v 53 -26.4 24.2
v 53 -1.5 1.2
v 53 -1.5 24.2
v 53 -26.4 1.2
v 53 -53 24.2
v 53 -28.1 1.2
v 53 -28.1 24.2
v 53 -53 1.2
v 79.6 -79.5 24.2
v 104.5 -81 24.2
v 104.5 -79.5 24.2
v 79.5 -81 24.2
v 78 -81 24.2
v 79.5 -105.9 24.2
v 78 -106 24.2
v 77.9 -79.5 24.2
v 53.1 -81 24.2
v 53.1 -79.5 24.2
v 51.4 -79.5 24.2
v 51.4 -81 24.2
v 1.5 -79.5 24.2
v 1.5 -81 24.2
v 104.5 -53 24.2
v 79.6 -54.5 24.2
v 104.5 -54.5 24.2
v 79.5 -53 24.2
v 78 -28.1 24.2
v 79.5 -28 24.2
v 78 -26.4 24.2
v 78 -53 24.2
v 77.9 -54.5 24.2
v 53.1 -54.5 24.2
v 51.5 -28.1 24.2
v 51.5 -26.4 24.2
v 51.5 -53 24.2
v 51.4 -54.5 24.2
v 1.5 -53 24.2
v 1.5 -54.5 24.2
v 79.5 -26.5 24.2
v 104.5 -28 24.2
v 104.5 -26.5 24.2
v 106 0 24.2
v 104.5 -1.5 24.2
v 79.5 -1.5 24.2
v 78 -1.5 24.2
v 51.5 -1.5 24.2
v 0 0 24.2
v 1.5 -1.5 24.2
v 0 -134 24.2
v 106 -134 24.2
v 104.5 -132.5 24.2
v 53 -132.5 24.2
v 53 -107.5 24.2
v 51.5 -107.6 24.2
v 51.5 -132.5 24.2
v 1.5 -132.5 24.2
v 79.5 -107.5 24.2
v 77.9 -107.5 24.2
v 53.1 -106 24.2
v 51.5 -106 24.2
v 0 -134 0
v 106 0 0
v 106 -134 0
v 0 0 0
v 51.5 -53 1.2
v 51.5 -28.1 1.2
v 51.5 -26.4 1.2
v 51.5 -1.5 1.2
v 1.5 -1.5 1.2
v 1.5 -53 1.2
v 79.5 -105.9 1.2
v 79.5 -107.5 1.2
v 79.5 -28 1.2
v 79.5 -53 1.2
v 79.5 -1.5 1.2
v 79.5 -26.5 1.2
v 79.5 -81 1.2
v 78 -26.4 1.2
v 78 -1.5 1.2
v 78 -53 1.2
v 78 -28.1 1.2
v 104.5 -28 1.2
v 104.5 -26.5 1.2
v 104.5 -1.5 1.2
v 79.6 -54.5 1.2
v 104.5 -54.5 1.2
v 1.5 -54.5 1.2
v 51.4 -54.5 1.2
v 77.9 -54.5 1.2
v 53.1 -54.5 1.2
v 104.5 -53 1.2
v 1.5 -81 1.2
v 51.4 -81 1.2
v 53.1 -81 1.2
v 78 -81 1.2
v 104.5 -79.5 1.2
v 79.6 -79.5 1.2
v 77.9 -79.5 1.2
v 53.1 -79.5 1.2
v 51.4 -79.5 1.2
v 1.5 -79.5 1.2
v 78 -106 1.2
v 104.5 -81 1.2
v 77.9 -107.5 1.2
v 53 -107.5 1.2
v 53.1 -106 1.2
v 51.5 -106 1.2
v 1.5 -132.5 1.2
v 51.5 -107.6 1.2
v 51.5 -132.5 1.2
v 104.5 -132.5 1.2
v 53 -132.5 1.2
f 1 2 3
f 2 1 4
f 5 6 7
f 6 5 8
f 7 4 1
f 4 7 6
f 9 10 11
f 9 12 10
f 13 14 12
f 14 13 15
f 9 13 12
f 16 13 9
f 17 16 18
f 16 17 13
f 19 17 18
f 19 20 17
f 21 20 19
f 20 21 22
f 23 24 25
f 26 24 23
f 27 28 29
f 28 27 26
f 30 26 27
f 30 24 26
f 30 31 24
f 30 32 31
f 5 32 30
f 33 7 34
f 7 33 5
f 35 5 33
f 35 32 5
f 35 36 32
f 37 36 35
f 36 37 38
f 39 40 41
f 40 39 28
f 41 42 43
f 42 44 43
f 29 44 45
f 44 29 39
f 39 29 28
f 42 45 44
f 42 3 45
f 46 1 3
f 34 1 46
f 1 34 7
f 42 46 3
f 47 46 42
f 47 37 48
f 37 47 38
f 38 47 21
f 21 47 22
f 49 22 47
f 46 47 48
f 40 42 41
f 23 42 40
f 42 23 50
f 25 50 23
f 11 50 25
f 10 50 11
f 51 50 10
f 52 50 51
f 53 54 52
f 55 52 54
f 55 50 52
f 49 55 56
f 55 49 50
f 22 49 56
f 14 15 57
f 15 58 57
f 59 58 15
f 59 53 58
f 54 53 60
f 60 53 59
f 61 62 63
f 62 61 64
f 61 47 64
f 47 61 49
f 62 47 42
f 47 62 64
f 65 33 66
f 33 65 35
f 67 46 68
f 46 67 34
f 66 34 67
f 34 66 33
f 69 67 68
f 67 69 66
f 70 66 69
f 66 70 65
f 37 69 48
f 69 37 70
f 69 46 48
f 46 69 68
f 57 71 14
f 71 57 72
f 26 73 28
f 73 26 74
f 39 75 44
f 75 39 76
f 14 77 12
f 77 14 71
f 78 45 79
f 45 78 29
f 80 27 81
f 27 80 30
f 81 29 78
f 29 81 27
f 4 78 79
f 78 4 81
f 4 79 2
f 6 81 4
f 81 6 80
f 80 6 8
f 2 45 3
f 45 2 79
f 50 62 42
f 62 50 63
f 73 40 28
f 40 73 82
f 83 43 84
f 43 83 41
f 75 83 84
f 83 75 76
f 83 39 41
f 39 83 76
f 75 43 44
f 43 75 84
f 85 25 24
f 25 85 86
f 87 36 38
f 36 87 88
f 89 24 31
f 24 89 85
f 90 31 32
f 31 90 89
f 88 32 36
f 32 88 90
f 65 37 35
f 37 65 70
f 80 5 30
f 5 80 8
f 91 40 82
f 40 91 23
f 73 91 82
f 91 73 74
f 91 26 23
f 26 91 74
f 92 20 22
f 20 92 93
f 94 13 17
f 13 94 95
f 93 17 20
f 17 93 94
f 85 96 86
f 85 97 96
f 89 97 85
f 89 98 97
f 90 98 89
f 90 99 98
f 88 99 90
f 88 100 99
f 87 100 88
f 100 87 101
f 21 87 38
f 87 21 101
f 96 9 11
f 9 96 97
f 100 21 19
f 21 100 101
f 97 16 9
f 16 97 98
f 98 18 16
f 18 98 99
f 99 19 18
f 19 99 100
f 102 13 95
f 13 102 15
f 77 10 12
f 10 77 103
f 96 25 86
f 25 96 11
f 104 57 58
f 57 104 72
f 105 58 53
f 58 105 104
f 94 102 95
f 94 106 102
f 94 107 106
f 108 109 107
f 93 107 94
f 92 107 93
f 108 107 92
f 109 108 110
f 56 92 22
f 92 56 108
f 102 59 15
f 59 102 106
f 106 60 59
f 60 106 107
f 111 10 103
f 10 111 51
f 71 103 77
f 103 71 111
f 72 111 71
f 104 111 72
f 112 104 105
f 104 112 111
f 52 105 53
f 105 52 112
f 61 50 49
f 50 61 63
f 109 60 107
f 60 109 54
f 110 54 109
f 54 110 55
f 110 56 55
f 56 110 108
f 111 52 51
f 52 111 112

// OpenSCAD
/* [Tray Parameters] */
// Tray Maker.  A text based way to create a custom tray/bin.
// an array of bin widths (ex: column widths).  This example will create first column 50mm wide, second 25mm, third 25mm.  If a 4th is desired enter [50,25,25,45].  Then 4th column will be 45mm wide.  Adding additional columns will require tray layout modifications to accommodate extra column.
_x_bin_widths = [50,25,25];  
// an integer for y bin length (ex: row height)
_y_bin_length = 25;  
// depth of each bin
_z_depth = 23;  
// thickness of walls separating bins.
_wall_width = 1.5;   
// thickness of bottom of tray
_bottom_thickness = 1.2;

/* [Tray Layout] */
// tray layout, array of strings defining layout. More info in thing description about this parameter 
// number of tray rows to use
_num_rows = 5;  
// tray layout for row 1
_tray_layout_1 = "| | |_|"; 
// tray layout for row 2
_tray_layout_2 = "|_|_|_|"; 
// row 3
_tray_layout_3 = "|_ _ _|";  
// etc.
_tray_layout_4 = "|  _| |";  
_tray_layout_5 = "|_|_ _|";
_tray_layout_6 = "|_|_|_|";
_tray_layout_7 = "|_|_|_|";
_tray_layout_8 = "|_|_|_|";
_tray_layout_9 = "|_|_|_|";
_tray_layout_10 = "|_|_|_|";
_tray_layout_11 = "|_|_|_|";
_tray_layout_12 = "|_|_|_|";
_tray_layout_13 = "|_|_|_|";
_tray_layout_14 = "|_|_|_|";
_tray_layout_15 = "|_|_|_|";
_tray_layout_16 = "|_|_|_|";
_tray_layout_17 = "|_|_|_|";
_tray_layout_18 = "|_|_|_|";
_tray_layout_19 = "|_|_|_|";
_tray_layout_20 = "|_|_|_|";
_tray_layout_21 = "|_|_|_|";
_tray_layout_22 = "|_|_|_|";


/* [Lid Parameters] */
// generate a lid (instead of the tray) that fits the defined tray
_generate_lid = "false"; //[true, false] 
// thickness of lid top
_lid_thickness = 0.9;  
// thickness of the lid's sides
_lid_wall_thickness = 1.5; 
// the depth of the lid.  
_lid_depth = 15; 
// with no fudge, the lid will be snug.  Depending on printer or preference provide negative to make tighter, positive to make looser. (ex: 0.2 will make a looser fitter lid)
_lid_fudge = 0;  

/* [Hidden] */
// for use if using as library and able to view console output.
_grid_x = 3;  // used to generate message for copy/paste.
_grid_y = 4;  // used to generate message for copy/paste.

// all this fun stuff is because thingiverse customizer cannot accept an array of string values as input.  

_tray_layout_array =
concat(
    _tray_layout_1,
    _tray_layout_2 ,
    _tray_layout_3 ,
    _tray_layout_4 ,
    _tray_layout_5 ,
    _tray_layout_6 ,
    _tray_layout_7 ,
    _tray_layout_8 ,
    _tray_layout_9 ,
    _tray_layout_10,
    _tray_layout_11 ,
    _tray_layout_12 ,
    _tray_layout_13 ,
    _tray_layout_14 ,
    _tray_layout_15 ,
    _tray_layout_16 ,
    _tray_layout_17 ,
    _tray_layout_18 ,
    _tray_layout_19 ,
    _tray_layout_20 ,
    _tray_layout_21 ,
    _tray_layout_22
);
_tray_layout = [for(i=[0:_num_rows-1]) _tray_layout_array[i]];
    echo(_tray_layout);
// end the special tray_layout handling for customizer.

// Tray layout explained: each row start with and end with | (a pipe)
// alternate placing | or _ or use space for none
// | represent separations on the row _ is the bottom edge of the cell.
// if grid is x cell = 3 and y cells = 2, and want each cell separate:
// [
//    "|_|_|_|",
//    "|_|_|_|"
// ]
// if instead, the last row should be "merged":
// [
//    "|_|_|_|",
//    "|_ _ _|"
// ]
//_tray_layout = 
//[
//    "| | |_|",
//    "|_|_|_|",
//    "|_| |_|",
//    "|_|_|_|"
//];



// sum vector values
function sumv(v,i,s=0) = (i==s ? v[i] : v[i] + sumv(v,i-1,s));
// output example line for tray layout.
function outv(i) = (i==0 ? "|" : str(outv(i-1) , "_|"));

// this module can be used as part of a library.
module tray(tray_layout = ["|_|","|_|"],
            x_bin_widths = [35],
            y_bin_length = 25,
            z_depth = 20,
            wall_width = 1.2,
            bottom_thickness = 1.2,
            grid_x = 4, // only used to generate example array
            grid_y = 3  // only used to generate example array
             )
{
    
    rows = len(tray_layout);
    cols = (len(tray_layout[0]) - 1 ) / 2;
    tray_string_len = len(tray_layout[0]);
    x_widths=concat([0],x_bin_widths);
    
    
    // generate and output example for tray_layout... copy paste for ease.
    
    for(r=[0:grid_y-1])
    {
        echo(outv(grid_x));
    }
    
    
    // layout initial box with compartments.
    mirror([0,1,0])  // do to application of logic, need to mirror through y axis.
    {
    difference()
    {
    union()
    {
        for(r=[0:rows-1], c=[1:cols ])
        {
            
            translate([sumv(x_widths,c-1,0) + ((c-1) * wall_width) ,
                           (y_bin_length * r) + (r * wall_width) ,
                           0 ])
            difference()
            {
                
                cube([x_widths[c] + (wall_width * 2),
                    y_bin_length + (wall_width * 2),
                    z_depth + bottom_thickness]);
                translate([wall_width,wall_width,bottom_thickness])
                cube([x_widths[c] ,
                    y_bin_length ,
                    z_depth + bottom_thickness]);
            }
        }
    }
   
    // remove appropriate walls.
        for(r=[0:rows-1], c=[1:tray_string_len - 2])  
                          // assume first and last postion are |
        {
            if(c % 2 == 1)
            {
                // bottom wall
               if(r - 1 != len(tray_layout)) 
               // assume bottom wall exists for final row.
               {
                   if(tray_layout[r][c] == " ")  
                   {  // remove this wall.
                       
               
                       x_width_ref = (c - 1) / 2;
                       translate([sumv(x_widths,x_width_ref,0) + 
                                        wall_width + 
                                        (x_width_ref * wall_width),
                                 ((r + 1) * y_bin_length ) + 
                                      (r * wall_width) +
                                      wall_width ,
                                  0]) 
                       // nudge to cover entire wall, and mov to correct z.
                       translate([0,-0.1, bottom_thickness]) 
                       cube([x_bin_widths[x_width_ref],
                             wall_width + .2,
                            z_depth + bottom_thickness]);
                   }
                }
            }
            else
            {
               // side wall
               if(tray_layout[r][c] == " ")  
               {  // remove this wall.
                  
                  x_width_ref = (c/2);
                  translate([sumv(x_widths,x_width_ref,0) + 
                                        (x_width_ref * wall_width) ,
                             ((r) * y_bin_length ) + 
                                      (r * wall_width) +
                                      wall_width ,
                            0]) 
                  // nudge to cover entire wall, and mov to correct z. 
                  translate([-0.1,0,bottom_thickness]) 
                  cube([wall_width + .2, 
                        y_bin_length,
                        z_depth + bottom_thickness]); 
                   
                  // remove remaining peg if entire intersection should be removed
                  
                   if(tray_layout[r-1][c] == " " &&
                      tray_layout[r-1][c - 1] == " " &&
                      tray_layout[r-1][c - 1] == " " )
                   {
                       
                       translate([sumv(x_widths,x_width_ref,0) + 
                                        (x_width_ref * wall_width) ,
                             ((r) * y_bin_length ) + 
                                      (r * wall_width),
                            0])
                       translate([-0.1,-.1,bottom_thickness]) 
                       cube([wall_width + .2, 
                             wall_width + .2, 
                             z_depth + bottom_thickness]);
                   }
                   
                   
               }

            }
  
        }
    }
    } // end mirror
}

module tray_lid(      // generate a lid for the defined tray.
            lid_thickness = 1.2,
            lid_wall_thickness = 1.5,
            lid_depth = 15,
            lid_fudge =0,
            // --- following defines the tray this lid will fit---
            tray_layout = ["|_|","|_|"],
            x_bin_widths = [35],
            y_bin_length = 25,
            z_depth = 20,
            wall_width = 1.2,
            bottom_thickness = 1.2)
{
    rows = len(tray_layout);  
    cols = (len(tray_layout[0]) - 1 ) / 2;
    tray_string_len = len(tray_layout[0]);
    
    x_size_tray = sumv(x_bin_widths,len(x_bin_widths) - 1,0) + 
                      ((len(x_bin_widths) + 1) * wall_width);
    y_size_tray = (rows * y_bin_length) + ((rows + 1) * wall_width);
    
    // 0.8 is a good looseness for a lid (at least for my printrbot), fudging this can make tighter or looser.
    x_inner_lid = x_size_tray + 1 + lid_fudge;  
    y_inner_lid = y_size_tray + 1 + lid_fudge;
    
    x_lid_outer = x_inner_lid + (lid_wall_thickness * 2);
    y_lid_outer = y_inner_lid + (lid_wall_thickness * 2);
    z_lid_total_h = lid_depth + lid_thickness;
    difference()
    {
       cube([x_lid_outer, y_lid_outer, z_lid_total_h]);
       translate([lid_wall_thickness,lid_wall_thickness,lid_thickness]) 
          cube([x_inner_lid, y_inner_lid, z_lid_total_h]); 
    }
}


// if this is used as a library the "tray_layout" should be like the following: 
//_tray_layout = 
//[
//    "| | |_|",
//    "|_|_|_|",
//    "|_| |_|",
//    "|_|_|_|"
//];

if(_generate_lid == "true")
{
    tray_lid(
        _lid_thickness,
        _lid_wall_thickness,
        _lid_depth,
        _lid_fudge,
        _tray_layout ,
        _x_bin_widths ,
        _y_bin_length ,
        _z_depth ,
        _wall_width ,
        _bottom_thickness
        );
}
else
{
    tray(
        _tray_layout ,
        _x_bin_widths ,
        _y_bin_length ,
        _z_depth ,
        _wall_width ,
        _bottom_thickness ,
        _grid_x,
        _grid_y
    );
}
